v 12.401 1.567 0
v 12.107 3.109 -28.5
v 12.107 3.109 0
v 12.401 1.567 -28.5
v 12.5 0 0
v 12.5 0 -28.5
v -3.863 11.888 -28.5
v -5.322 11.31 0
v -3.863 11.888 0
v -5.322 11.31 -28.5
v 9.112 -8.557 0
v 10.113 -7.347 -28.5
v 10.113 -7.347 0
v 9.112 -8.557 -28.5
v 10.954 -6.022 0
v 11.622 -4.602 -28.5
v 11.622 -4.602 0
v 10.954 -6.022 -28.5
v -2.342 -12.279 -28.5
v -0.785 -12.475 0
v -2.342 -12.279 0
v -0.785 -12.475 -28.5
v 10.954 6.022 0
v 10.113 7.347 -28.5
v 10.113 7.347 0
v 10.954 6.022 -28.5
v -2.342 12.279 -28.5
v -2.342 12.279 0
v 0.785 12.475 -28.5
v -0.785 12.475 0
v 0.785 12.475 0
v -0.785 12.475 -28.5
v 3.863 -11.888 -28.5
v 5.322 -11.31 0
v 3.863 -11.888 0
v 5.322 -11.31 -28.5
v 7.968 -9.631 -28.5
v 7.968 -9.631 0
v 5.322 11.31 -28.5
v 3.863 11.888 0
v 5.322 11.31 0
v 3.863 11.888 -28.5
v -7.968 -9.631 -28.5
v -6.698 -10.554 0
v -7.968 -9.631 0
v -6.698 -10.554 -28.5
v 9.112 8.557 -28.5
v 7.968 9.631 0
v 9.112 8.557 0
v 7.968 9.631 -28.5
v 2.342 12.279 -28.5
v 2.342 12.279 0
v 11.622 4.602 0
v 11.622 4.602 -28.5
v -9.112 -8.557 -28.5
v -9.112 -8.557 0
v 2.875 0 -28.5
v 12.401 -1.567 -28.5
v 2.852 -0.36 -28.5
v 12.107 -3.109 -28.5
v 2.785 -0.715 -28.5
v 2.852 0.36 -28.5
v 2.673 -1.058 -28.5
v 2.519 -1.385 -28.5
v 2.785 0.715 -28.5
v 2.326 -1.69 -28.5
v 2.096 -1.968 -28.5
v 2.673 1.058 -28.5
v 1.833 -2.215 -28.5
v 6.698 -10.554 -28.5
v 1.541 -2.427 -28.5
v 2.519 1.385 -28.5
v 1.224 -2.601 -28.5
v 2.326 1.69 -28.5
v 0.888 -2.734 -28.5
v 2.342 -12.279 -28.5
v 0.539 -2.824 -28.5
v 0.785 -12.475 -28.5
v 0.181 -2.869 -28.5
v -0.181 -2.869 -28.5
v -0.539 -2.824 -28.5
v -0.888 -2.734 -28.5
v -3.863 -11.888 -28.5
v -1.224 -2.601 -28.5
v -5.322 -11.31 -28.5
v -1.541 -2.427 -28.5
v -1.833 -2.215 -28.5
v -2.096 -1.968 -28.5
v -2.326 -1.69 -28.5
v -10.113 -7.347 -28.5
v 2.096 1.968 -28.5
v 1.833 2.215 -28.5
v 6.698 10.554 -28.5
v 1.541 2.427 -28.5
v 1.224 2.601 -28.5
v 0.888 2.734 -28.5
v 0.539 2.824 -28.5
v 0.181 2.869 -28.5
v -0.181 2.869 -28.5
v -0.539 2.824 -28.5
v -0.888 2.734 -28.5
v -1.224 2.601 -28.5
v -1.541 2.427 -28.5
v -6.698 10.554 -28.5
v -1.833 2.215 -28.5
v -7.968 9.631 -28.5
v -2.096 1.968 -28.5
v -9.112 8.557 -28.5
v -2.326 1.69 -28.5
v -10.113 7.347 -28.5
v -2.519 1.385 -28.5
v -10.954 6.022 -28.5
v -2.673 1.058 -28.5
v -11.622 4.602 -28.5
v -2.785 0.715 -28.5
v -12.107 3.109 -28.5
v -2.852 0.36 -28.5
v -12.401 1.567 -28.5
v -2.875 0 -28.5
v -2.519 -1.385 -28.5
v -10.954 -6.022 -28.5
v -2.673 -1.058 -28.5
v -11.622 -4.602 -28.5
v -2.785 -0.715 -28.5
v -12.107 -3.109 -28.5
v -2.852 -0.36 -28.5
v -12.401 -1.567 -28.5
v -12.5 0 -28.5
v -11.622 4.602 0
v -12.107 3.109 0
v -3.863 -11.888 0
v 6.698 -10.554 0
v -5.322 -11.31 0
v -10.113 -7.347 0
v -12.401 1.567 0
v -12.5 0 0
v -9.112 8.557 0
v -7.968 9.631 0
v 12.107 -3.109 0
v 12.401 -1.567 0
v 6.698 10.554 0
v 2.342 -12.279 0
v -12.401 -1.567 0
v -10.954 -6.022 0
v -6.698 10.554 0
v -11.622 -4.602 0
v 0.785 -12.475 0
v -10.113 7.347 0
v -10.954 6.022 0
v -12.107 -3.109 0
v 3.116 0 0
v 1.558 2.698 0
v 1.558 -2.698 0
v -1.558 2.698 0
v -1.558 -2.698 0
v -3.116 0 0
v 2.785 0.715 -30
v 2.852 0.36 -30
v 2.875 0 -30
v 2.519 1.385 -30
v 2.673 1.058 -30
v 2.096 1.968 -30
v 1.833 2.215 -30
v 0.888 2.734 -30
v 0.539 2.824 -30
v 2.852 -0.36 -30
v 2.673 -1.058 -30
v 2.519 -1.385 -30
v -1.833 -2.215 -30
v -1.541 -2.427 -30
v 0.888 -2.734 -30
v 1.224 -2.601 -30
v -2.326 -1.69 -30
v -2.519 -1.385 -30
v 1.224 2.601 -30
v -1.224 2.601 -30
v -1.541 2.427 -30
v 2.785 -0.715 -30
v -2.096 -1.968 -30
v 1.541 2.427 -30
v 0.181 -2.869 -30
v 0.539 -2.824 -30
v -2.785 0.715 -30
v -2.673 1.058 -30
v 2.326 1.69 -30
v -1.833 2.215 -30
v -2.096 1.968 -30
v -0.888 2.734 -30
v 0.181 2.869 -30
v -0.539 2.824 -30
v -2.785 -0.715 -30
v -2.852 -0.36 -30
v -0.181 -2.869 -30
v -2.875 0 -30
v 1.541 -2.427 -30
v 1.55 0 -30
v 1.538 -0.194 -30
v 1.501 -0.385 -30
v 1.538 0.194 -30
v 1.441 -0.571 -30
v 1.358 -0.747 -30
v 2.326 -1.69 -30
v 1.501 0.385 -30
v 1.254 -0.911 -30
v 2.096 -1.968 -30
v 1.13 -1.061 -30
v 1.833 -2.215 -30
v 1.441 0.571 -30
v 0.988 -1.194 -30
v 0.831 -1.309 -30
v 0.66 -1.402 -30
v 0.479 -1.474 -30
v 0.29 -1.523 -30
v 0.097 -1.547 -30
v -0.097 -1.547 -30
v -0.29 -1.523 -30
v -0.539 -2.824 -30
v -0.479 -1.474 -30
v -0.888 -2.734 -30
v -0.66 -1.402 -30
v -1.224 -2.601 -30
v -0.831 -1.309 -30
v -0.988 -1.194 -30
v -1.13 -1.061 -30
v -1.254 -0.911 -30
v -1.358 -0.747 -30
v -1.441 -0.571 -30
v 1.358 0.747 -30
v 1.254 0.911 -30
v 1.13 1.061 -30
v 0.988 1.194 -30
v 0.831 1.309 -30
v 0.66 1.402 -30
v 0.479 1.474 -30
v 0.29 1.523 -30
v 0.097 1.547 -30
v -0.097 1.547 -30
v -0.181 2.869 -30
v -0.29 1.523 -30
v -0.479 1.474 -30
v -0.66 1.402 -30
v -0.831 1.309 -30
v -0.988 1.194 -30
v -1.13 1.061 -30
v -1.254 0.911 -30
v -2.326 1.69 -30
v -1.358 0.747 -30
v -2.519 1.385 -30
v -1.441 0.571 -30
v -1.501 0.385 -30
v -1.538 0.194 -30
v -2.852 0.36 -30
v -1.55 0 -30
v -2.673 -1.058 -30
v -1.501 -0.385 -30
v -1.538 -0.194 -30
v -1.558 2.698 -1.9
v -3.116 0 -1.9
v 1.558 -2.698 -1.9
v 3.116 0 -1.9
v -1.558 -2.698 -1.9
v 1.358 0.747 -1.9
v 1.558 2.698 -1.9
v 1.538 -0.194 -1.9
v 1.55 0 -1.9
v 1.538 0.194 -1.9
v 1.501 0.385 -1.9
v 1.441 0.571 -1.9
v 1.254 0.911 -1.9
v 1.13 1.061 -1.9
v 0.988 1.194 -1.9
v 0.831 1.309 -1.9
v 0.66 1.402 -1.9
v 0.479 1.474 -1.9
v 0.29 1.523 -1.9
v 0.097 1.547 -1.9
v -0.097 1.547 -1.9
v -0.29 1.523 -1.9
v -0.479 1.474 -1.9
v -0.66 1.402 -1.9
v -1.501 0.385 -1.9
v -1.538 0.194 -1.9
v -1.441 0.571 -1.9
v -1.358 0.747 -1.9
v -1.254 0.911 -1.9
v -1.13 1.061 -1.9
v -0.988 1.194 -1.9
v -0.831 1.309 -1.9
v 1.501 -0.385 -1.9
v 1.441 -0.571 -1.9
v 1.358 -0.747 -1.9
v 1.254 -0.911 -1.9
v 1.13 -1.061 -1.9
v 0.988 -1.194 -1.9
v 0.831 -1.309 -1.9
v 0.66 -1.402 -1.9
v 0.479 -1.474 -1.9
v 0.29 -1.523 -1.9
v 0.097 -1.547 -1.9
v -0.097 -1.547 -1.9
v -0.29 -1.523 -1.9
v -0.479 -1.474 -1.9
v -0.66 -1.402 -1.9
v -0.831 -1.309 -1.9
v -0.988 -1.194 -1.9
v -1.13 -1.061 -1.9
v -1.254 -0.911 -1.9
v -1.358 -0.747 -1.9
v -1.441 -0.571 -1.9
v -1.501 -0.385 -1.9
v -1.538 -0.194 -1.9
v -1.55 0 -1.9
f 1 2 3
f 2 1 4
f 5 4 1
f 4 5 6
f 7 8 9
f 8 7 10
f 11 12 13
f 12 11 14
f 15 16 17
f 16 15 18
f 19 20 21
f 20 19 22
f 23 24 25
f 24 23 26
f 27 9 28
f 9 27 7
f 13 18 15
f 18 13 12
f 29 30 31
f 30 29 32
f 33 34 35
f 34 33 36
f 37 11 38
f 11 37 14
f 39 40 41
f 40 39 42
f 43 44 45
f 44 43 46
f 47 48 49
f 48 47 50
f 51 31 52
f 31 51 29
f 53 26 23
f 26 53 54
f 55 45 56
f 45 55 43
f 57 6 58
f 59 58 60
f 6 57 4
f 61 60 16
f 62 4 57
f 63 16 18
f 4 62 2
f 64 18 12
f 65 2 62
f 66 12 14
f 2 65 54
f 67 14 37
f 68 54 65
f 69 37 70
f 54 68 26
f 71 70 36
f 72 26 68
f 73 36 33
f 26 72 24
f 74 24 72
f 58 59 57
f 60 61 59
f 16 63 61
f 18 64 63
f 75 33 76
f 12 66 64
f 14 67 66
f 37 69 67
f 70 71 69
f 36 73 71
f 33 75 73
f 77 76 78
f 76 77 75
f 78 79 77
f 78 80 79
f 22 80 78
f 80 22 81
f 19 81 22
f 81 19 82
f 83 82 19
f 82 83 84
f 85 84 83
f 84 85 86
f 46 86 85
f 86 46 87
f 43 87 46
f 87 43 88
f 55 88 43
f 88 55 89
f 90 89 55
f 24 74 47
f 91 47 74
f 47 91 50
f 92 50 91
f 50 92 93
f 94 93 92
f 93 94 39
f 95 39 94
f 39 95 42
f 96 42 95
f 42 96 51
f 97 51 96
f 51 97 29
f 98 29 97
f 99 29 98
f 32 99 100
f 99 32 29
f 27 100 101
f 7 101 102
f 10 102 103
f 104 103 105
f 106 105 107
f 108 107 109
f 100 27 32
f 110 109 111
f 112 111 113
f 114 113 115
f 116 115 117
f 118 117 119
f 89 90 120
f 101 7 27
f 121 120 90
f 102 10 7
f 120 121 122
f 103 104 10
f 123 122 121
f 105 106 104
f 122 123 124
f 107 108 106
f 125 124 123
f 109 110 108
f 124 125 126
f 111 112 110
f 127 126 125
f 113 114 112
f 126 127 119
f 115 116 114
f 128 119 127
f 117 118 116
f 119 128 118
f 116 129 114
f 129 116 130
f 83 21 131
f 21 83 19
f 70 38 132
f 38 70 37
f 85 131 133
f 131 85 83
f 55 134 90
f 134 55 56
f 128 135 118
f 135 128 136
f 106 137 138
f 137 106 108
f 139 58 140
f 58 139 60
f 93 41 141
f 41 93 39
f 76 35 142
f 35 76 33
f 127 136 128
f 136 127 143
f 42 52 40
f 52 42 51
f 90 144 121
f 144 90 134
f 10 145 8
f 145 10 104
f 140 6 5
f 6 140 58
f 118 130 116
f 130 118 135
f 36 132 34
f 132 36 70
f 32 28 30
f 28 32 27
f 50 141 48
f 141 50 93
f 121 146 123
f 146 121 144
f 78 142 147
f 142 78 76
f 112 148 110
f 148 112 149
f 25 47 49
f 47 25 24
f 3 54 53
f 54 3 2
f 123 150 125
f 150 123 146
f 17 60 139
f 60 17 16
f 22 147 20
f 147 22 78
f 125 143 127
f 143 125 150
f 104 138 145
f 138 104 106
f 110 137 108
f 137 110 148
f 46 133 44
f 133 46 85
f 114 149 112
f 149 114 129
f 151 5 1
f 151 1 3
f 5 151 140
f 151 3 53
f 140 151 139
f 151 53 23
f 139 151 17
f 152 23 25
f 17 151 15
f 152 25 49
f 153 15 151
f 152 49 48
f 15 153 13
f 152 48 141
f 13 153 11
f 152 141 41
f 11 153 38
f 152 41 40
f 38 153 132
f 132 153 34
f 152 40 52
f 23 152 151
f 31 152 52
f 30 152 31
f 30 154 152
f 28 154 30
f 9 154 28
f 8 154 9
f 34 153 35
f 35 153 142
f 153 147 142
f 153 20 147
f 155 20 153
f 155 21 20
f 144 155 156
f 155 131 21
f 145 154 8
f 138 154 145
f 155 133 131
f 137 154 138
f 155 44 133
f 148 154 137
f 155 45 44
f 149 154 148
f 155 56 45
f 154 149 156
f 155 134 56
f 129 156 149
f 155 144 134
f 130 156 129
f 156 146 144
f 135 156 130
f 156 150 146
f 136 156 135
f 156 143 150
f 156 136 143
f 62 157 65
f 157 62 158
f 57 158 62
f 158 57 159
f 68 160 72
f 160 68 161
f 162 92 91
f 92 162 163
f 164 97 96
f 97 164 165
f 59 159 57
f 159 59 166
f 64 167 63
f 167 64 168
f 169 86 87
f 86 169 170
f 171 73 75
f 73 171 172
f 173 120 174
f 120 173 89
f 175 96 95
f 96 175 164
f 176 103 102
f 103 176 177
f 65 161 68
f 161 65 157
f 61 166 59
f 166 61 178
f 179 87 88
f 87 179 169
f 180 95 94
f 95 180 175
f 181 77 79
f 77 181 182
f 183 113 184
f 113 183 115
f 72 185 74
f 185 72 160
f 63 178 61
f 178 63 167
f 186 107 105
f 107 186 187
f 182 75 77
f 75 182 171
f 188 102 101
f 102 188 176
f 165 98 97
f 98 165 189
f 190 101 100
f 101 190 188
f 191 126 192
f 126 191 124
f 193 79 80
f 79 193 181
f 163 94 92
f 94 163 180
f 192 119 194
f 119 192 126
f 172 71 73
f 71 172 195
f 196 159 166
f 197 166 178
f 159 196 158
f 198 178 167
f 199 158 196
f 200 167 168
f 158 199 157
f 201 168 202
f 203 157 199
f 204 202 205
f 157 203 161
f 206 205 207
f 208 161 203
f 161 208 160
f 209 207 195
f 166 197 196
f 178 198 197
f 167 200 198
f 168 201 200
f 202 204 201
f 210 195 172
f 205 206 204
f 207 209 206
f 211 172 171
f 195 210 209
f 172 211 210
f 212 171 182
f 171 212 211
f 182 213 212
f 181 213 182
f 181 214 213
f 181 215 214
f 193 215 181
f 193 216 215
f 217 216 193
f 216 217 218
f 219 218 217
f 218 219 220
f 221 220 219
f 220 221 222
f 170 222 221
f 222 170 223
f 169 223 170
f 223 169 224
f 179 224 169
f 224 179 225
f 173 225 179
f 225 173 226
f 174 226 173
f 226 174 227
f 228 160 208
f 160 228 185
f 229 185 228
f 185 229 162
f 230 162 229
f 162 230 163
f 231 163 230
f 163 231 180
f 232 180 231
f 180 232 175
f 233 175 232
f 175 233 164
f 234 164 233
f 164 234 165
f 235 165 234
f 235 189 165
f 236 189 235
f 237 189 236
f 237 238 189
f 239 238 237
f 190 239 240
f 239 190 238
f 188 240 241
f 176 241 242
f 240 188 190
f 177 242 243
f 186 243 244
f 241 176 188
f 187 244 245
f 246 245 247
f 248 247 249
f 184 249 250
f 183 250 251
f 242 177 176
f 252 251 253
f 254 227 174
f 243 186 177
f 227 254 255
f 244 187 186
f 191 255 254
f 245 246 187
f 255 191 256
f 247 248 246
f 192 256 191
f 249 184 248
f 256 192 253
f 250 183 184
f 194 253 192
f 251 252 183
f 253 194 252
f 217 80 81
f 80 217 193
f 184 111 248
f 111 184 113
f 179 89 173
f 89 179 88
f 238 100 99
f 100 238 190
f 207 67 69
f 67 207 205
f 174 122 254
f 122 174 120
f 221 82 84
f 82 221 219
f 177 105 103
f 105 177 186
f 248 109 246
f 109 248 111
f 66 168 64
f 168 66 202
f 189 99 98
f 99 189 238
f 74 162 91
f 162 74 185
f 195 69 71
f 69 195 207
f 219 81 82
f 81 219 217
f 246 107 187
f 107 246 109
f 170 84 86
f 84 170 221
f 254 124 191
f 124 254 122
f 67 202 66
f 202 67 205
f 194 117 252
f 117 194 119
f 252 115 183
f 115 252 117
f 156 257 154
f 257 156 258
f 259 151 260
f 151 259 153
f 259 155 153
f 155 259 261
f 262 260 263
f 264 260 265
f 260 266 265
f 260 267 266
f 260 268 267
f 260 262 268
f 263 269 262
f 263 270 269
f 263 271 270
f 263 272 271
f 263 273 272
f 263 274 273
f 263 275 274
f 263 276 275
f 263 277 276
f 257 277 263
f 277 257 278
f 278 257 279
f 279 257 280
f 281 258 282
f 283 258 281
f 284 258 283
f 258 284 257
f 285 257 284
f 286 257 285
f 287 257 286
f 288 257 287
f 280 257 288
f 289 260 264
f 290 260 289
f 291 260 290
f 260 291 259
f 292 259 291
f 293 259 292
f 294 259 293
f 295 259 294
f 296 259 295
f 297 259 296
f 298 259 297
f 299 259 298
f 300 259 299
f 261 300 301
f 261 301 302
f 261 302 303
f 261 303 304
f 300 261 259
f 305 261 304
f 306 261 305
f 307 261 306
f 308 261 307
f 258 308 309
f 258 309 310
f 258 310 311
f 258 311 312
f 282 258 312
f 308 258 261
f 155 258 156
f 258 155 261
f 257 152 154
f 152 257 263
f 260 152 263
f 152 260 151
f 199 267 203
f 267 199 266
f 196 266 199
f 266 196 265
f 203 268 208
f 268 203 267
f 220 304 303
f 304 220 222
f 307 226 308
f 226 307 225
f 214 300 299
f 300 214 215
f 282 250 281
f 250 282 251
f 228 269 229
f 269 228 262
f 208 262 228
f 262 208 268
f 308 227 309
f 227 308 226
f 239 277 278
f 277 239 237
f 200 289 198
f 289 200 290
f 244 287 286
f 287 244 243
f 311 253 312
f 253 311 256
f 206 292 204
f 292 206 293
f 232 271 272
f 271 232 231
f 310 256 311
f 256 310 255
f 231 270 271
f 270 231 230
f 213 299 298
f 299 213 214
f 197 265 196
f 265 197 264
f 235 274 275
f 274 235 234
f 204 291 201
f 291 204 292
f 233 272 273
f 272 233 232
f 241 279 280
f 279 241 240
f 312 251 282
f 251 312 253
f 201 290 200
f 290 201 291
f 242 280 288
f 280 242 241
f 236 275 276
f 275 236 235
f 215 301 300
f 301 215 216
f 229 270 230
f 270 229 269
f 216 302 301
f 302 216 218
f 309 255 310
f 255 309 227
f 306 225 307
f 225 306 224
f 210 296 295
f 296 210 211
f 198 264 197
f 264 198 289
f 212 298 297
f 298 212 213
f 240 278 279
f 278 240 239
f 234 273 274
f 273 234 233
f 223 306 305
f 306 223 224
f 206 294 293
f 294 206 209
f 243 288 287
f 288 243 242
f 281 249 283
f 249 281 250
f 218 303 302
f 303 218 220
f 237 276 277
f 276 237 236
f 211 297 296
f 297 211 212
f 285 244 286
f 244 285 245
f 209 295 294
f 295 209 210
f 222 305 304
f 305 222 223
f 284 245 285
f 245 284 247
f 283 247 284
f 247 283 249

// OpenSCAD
$fn = 50;


difference() {
	union() {
		translate(v = [0, 0, -28.5000000000]) {
			cylinder(h = 28.5000000000, r = 12.5000000000);
		}
		#translate(v = [0, 0, -30.0000000000]) {
			cylinder(h = 30, r = 2.8750000000);
		}
	}
	union() {
		translate(v = [0, 0, 0]) {
			rotate(a = [0, 0, 0]) {
				difference() {
					union() {
						translate(v = [0, 0, -1.9000000000]) {
							linear_extrude(height = 1.9000000000) {
								polygon(points = [[3.1158000000, 0.0000000000], [1.5579000000, 2.6983619531], [-1.5579000000, 2.6983619531], [-3.1158000000, 0.0000000000], [-1.5579000000, -2.6983619531], [1.5579000000, -2.6983619531]]);
							}
						}
					}
					union();
				}
			}
		}
		#translate(v = [0, 0, -100.0000000000]) {
			cylinder(h = 200, r = 1.5500000000);
		}
	}
}
